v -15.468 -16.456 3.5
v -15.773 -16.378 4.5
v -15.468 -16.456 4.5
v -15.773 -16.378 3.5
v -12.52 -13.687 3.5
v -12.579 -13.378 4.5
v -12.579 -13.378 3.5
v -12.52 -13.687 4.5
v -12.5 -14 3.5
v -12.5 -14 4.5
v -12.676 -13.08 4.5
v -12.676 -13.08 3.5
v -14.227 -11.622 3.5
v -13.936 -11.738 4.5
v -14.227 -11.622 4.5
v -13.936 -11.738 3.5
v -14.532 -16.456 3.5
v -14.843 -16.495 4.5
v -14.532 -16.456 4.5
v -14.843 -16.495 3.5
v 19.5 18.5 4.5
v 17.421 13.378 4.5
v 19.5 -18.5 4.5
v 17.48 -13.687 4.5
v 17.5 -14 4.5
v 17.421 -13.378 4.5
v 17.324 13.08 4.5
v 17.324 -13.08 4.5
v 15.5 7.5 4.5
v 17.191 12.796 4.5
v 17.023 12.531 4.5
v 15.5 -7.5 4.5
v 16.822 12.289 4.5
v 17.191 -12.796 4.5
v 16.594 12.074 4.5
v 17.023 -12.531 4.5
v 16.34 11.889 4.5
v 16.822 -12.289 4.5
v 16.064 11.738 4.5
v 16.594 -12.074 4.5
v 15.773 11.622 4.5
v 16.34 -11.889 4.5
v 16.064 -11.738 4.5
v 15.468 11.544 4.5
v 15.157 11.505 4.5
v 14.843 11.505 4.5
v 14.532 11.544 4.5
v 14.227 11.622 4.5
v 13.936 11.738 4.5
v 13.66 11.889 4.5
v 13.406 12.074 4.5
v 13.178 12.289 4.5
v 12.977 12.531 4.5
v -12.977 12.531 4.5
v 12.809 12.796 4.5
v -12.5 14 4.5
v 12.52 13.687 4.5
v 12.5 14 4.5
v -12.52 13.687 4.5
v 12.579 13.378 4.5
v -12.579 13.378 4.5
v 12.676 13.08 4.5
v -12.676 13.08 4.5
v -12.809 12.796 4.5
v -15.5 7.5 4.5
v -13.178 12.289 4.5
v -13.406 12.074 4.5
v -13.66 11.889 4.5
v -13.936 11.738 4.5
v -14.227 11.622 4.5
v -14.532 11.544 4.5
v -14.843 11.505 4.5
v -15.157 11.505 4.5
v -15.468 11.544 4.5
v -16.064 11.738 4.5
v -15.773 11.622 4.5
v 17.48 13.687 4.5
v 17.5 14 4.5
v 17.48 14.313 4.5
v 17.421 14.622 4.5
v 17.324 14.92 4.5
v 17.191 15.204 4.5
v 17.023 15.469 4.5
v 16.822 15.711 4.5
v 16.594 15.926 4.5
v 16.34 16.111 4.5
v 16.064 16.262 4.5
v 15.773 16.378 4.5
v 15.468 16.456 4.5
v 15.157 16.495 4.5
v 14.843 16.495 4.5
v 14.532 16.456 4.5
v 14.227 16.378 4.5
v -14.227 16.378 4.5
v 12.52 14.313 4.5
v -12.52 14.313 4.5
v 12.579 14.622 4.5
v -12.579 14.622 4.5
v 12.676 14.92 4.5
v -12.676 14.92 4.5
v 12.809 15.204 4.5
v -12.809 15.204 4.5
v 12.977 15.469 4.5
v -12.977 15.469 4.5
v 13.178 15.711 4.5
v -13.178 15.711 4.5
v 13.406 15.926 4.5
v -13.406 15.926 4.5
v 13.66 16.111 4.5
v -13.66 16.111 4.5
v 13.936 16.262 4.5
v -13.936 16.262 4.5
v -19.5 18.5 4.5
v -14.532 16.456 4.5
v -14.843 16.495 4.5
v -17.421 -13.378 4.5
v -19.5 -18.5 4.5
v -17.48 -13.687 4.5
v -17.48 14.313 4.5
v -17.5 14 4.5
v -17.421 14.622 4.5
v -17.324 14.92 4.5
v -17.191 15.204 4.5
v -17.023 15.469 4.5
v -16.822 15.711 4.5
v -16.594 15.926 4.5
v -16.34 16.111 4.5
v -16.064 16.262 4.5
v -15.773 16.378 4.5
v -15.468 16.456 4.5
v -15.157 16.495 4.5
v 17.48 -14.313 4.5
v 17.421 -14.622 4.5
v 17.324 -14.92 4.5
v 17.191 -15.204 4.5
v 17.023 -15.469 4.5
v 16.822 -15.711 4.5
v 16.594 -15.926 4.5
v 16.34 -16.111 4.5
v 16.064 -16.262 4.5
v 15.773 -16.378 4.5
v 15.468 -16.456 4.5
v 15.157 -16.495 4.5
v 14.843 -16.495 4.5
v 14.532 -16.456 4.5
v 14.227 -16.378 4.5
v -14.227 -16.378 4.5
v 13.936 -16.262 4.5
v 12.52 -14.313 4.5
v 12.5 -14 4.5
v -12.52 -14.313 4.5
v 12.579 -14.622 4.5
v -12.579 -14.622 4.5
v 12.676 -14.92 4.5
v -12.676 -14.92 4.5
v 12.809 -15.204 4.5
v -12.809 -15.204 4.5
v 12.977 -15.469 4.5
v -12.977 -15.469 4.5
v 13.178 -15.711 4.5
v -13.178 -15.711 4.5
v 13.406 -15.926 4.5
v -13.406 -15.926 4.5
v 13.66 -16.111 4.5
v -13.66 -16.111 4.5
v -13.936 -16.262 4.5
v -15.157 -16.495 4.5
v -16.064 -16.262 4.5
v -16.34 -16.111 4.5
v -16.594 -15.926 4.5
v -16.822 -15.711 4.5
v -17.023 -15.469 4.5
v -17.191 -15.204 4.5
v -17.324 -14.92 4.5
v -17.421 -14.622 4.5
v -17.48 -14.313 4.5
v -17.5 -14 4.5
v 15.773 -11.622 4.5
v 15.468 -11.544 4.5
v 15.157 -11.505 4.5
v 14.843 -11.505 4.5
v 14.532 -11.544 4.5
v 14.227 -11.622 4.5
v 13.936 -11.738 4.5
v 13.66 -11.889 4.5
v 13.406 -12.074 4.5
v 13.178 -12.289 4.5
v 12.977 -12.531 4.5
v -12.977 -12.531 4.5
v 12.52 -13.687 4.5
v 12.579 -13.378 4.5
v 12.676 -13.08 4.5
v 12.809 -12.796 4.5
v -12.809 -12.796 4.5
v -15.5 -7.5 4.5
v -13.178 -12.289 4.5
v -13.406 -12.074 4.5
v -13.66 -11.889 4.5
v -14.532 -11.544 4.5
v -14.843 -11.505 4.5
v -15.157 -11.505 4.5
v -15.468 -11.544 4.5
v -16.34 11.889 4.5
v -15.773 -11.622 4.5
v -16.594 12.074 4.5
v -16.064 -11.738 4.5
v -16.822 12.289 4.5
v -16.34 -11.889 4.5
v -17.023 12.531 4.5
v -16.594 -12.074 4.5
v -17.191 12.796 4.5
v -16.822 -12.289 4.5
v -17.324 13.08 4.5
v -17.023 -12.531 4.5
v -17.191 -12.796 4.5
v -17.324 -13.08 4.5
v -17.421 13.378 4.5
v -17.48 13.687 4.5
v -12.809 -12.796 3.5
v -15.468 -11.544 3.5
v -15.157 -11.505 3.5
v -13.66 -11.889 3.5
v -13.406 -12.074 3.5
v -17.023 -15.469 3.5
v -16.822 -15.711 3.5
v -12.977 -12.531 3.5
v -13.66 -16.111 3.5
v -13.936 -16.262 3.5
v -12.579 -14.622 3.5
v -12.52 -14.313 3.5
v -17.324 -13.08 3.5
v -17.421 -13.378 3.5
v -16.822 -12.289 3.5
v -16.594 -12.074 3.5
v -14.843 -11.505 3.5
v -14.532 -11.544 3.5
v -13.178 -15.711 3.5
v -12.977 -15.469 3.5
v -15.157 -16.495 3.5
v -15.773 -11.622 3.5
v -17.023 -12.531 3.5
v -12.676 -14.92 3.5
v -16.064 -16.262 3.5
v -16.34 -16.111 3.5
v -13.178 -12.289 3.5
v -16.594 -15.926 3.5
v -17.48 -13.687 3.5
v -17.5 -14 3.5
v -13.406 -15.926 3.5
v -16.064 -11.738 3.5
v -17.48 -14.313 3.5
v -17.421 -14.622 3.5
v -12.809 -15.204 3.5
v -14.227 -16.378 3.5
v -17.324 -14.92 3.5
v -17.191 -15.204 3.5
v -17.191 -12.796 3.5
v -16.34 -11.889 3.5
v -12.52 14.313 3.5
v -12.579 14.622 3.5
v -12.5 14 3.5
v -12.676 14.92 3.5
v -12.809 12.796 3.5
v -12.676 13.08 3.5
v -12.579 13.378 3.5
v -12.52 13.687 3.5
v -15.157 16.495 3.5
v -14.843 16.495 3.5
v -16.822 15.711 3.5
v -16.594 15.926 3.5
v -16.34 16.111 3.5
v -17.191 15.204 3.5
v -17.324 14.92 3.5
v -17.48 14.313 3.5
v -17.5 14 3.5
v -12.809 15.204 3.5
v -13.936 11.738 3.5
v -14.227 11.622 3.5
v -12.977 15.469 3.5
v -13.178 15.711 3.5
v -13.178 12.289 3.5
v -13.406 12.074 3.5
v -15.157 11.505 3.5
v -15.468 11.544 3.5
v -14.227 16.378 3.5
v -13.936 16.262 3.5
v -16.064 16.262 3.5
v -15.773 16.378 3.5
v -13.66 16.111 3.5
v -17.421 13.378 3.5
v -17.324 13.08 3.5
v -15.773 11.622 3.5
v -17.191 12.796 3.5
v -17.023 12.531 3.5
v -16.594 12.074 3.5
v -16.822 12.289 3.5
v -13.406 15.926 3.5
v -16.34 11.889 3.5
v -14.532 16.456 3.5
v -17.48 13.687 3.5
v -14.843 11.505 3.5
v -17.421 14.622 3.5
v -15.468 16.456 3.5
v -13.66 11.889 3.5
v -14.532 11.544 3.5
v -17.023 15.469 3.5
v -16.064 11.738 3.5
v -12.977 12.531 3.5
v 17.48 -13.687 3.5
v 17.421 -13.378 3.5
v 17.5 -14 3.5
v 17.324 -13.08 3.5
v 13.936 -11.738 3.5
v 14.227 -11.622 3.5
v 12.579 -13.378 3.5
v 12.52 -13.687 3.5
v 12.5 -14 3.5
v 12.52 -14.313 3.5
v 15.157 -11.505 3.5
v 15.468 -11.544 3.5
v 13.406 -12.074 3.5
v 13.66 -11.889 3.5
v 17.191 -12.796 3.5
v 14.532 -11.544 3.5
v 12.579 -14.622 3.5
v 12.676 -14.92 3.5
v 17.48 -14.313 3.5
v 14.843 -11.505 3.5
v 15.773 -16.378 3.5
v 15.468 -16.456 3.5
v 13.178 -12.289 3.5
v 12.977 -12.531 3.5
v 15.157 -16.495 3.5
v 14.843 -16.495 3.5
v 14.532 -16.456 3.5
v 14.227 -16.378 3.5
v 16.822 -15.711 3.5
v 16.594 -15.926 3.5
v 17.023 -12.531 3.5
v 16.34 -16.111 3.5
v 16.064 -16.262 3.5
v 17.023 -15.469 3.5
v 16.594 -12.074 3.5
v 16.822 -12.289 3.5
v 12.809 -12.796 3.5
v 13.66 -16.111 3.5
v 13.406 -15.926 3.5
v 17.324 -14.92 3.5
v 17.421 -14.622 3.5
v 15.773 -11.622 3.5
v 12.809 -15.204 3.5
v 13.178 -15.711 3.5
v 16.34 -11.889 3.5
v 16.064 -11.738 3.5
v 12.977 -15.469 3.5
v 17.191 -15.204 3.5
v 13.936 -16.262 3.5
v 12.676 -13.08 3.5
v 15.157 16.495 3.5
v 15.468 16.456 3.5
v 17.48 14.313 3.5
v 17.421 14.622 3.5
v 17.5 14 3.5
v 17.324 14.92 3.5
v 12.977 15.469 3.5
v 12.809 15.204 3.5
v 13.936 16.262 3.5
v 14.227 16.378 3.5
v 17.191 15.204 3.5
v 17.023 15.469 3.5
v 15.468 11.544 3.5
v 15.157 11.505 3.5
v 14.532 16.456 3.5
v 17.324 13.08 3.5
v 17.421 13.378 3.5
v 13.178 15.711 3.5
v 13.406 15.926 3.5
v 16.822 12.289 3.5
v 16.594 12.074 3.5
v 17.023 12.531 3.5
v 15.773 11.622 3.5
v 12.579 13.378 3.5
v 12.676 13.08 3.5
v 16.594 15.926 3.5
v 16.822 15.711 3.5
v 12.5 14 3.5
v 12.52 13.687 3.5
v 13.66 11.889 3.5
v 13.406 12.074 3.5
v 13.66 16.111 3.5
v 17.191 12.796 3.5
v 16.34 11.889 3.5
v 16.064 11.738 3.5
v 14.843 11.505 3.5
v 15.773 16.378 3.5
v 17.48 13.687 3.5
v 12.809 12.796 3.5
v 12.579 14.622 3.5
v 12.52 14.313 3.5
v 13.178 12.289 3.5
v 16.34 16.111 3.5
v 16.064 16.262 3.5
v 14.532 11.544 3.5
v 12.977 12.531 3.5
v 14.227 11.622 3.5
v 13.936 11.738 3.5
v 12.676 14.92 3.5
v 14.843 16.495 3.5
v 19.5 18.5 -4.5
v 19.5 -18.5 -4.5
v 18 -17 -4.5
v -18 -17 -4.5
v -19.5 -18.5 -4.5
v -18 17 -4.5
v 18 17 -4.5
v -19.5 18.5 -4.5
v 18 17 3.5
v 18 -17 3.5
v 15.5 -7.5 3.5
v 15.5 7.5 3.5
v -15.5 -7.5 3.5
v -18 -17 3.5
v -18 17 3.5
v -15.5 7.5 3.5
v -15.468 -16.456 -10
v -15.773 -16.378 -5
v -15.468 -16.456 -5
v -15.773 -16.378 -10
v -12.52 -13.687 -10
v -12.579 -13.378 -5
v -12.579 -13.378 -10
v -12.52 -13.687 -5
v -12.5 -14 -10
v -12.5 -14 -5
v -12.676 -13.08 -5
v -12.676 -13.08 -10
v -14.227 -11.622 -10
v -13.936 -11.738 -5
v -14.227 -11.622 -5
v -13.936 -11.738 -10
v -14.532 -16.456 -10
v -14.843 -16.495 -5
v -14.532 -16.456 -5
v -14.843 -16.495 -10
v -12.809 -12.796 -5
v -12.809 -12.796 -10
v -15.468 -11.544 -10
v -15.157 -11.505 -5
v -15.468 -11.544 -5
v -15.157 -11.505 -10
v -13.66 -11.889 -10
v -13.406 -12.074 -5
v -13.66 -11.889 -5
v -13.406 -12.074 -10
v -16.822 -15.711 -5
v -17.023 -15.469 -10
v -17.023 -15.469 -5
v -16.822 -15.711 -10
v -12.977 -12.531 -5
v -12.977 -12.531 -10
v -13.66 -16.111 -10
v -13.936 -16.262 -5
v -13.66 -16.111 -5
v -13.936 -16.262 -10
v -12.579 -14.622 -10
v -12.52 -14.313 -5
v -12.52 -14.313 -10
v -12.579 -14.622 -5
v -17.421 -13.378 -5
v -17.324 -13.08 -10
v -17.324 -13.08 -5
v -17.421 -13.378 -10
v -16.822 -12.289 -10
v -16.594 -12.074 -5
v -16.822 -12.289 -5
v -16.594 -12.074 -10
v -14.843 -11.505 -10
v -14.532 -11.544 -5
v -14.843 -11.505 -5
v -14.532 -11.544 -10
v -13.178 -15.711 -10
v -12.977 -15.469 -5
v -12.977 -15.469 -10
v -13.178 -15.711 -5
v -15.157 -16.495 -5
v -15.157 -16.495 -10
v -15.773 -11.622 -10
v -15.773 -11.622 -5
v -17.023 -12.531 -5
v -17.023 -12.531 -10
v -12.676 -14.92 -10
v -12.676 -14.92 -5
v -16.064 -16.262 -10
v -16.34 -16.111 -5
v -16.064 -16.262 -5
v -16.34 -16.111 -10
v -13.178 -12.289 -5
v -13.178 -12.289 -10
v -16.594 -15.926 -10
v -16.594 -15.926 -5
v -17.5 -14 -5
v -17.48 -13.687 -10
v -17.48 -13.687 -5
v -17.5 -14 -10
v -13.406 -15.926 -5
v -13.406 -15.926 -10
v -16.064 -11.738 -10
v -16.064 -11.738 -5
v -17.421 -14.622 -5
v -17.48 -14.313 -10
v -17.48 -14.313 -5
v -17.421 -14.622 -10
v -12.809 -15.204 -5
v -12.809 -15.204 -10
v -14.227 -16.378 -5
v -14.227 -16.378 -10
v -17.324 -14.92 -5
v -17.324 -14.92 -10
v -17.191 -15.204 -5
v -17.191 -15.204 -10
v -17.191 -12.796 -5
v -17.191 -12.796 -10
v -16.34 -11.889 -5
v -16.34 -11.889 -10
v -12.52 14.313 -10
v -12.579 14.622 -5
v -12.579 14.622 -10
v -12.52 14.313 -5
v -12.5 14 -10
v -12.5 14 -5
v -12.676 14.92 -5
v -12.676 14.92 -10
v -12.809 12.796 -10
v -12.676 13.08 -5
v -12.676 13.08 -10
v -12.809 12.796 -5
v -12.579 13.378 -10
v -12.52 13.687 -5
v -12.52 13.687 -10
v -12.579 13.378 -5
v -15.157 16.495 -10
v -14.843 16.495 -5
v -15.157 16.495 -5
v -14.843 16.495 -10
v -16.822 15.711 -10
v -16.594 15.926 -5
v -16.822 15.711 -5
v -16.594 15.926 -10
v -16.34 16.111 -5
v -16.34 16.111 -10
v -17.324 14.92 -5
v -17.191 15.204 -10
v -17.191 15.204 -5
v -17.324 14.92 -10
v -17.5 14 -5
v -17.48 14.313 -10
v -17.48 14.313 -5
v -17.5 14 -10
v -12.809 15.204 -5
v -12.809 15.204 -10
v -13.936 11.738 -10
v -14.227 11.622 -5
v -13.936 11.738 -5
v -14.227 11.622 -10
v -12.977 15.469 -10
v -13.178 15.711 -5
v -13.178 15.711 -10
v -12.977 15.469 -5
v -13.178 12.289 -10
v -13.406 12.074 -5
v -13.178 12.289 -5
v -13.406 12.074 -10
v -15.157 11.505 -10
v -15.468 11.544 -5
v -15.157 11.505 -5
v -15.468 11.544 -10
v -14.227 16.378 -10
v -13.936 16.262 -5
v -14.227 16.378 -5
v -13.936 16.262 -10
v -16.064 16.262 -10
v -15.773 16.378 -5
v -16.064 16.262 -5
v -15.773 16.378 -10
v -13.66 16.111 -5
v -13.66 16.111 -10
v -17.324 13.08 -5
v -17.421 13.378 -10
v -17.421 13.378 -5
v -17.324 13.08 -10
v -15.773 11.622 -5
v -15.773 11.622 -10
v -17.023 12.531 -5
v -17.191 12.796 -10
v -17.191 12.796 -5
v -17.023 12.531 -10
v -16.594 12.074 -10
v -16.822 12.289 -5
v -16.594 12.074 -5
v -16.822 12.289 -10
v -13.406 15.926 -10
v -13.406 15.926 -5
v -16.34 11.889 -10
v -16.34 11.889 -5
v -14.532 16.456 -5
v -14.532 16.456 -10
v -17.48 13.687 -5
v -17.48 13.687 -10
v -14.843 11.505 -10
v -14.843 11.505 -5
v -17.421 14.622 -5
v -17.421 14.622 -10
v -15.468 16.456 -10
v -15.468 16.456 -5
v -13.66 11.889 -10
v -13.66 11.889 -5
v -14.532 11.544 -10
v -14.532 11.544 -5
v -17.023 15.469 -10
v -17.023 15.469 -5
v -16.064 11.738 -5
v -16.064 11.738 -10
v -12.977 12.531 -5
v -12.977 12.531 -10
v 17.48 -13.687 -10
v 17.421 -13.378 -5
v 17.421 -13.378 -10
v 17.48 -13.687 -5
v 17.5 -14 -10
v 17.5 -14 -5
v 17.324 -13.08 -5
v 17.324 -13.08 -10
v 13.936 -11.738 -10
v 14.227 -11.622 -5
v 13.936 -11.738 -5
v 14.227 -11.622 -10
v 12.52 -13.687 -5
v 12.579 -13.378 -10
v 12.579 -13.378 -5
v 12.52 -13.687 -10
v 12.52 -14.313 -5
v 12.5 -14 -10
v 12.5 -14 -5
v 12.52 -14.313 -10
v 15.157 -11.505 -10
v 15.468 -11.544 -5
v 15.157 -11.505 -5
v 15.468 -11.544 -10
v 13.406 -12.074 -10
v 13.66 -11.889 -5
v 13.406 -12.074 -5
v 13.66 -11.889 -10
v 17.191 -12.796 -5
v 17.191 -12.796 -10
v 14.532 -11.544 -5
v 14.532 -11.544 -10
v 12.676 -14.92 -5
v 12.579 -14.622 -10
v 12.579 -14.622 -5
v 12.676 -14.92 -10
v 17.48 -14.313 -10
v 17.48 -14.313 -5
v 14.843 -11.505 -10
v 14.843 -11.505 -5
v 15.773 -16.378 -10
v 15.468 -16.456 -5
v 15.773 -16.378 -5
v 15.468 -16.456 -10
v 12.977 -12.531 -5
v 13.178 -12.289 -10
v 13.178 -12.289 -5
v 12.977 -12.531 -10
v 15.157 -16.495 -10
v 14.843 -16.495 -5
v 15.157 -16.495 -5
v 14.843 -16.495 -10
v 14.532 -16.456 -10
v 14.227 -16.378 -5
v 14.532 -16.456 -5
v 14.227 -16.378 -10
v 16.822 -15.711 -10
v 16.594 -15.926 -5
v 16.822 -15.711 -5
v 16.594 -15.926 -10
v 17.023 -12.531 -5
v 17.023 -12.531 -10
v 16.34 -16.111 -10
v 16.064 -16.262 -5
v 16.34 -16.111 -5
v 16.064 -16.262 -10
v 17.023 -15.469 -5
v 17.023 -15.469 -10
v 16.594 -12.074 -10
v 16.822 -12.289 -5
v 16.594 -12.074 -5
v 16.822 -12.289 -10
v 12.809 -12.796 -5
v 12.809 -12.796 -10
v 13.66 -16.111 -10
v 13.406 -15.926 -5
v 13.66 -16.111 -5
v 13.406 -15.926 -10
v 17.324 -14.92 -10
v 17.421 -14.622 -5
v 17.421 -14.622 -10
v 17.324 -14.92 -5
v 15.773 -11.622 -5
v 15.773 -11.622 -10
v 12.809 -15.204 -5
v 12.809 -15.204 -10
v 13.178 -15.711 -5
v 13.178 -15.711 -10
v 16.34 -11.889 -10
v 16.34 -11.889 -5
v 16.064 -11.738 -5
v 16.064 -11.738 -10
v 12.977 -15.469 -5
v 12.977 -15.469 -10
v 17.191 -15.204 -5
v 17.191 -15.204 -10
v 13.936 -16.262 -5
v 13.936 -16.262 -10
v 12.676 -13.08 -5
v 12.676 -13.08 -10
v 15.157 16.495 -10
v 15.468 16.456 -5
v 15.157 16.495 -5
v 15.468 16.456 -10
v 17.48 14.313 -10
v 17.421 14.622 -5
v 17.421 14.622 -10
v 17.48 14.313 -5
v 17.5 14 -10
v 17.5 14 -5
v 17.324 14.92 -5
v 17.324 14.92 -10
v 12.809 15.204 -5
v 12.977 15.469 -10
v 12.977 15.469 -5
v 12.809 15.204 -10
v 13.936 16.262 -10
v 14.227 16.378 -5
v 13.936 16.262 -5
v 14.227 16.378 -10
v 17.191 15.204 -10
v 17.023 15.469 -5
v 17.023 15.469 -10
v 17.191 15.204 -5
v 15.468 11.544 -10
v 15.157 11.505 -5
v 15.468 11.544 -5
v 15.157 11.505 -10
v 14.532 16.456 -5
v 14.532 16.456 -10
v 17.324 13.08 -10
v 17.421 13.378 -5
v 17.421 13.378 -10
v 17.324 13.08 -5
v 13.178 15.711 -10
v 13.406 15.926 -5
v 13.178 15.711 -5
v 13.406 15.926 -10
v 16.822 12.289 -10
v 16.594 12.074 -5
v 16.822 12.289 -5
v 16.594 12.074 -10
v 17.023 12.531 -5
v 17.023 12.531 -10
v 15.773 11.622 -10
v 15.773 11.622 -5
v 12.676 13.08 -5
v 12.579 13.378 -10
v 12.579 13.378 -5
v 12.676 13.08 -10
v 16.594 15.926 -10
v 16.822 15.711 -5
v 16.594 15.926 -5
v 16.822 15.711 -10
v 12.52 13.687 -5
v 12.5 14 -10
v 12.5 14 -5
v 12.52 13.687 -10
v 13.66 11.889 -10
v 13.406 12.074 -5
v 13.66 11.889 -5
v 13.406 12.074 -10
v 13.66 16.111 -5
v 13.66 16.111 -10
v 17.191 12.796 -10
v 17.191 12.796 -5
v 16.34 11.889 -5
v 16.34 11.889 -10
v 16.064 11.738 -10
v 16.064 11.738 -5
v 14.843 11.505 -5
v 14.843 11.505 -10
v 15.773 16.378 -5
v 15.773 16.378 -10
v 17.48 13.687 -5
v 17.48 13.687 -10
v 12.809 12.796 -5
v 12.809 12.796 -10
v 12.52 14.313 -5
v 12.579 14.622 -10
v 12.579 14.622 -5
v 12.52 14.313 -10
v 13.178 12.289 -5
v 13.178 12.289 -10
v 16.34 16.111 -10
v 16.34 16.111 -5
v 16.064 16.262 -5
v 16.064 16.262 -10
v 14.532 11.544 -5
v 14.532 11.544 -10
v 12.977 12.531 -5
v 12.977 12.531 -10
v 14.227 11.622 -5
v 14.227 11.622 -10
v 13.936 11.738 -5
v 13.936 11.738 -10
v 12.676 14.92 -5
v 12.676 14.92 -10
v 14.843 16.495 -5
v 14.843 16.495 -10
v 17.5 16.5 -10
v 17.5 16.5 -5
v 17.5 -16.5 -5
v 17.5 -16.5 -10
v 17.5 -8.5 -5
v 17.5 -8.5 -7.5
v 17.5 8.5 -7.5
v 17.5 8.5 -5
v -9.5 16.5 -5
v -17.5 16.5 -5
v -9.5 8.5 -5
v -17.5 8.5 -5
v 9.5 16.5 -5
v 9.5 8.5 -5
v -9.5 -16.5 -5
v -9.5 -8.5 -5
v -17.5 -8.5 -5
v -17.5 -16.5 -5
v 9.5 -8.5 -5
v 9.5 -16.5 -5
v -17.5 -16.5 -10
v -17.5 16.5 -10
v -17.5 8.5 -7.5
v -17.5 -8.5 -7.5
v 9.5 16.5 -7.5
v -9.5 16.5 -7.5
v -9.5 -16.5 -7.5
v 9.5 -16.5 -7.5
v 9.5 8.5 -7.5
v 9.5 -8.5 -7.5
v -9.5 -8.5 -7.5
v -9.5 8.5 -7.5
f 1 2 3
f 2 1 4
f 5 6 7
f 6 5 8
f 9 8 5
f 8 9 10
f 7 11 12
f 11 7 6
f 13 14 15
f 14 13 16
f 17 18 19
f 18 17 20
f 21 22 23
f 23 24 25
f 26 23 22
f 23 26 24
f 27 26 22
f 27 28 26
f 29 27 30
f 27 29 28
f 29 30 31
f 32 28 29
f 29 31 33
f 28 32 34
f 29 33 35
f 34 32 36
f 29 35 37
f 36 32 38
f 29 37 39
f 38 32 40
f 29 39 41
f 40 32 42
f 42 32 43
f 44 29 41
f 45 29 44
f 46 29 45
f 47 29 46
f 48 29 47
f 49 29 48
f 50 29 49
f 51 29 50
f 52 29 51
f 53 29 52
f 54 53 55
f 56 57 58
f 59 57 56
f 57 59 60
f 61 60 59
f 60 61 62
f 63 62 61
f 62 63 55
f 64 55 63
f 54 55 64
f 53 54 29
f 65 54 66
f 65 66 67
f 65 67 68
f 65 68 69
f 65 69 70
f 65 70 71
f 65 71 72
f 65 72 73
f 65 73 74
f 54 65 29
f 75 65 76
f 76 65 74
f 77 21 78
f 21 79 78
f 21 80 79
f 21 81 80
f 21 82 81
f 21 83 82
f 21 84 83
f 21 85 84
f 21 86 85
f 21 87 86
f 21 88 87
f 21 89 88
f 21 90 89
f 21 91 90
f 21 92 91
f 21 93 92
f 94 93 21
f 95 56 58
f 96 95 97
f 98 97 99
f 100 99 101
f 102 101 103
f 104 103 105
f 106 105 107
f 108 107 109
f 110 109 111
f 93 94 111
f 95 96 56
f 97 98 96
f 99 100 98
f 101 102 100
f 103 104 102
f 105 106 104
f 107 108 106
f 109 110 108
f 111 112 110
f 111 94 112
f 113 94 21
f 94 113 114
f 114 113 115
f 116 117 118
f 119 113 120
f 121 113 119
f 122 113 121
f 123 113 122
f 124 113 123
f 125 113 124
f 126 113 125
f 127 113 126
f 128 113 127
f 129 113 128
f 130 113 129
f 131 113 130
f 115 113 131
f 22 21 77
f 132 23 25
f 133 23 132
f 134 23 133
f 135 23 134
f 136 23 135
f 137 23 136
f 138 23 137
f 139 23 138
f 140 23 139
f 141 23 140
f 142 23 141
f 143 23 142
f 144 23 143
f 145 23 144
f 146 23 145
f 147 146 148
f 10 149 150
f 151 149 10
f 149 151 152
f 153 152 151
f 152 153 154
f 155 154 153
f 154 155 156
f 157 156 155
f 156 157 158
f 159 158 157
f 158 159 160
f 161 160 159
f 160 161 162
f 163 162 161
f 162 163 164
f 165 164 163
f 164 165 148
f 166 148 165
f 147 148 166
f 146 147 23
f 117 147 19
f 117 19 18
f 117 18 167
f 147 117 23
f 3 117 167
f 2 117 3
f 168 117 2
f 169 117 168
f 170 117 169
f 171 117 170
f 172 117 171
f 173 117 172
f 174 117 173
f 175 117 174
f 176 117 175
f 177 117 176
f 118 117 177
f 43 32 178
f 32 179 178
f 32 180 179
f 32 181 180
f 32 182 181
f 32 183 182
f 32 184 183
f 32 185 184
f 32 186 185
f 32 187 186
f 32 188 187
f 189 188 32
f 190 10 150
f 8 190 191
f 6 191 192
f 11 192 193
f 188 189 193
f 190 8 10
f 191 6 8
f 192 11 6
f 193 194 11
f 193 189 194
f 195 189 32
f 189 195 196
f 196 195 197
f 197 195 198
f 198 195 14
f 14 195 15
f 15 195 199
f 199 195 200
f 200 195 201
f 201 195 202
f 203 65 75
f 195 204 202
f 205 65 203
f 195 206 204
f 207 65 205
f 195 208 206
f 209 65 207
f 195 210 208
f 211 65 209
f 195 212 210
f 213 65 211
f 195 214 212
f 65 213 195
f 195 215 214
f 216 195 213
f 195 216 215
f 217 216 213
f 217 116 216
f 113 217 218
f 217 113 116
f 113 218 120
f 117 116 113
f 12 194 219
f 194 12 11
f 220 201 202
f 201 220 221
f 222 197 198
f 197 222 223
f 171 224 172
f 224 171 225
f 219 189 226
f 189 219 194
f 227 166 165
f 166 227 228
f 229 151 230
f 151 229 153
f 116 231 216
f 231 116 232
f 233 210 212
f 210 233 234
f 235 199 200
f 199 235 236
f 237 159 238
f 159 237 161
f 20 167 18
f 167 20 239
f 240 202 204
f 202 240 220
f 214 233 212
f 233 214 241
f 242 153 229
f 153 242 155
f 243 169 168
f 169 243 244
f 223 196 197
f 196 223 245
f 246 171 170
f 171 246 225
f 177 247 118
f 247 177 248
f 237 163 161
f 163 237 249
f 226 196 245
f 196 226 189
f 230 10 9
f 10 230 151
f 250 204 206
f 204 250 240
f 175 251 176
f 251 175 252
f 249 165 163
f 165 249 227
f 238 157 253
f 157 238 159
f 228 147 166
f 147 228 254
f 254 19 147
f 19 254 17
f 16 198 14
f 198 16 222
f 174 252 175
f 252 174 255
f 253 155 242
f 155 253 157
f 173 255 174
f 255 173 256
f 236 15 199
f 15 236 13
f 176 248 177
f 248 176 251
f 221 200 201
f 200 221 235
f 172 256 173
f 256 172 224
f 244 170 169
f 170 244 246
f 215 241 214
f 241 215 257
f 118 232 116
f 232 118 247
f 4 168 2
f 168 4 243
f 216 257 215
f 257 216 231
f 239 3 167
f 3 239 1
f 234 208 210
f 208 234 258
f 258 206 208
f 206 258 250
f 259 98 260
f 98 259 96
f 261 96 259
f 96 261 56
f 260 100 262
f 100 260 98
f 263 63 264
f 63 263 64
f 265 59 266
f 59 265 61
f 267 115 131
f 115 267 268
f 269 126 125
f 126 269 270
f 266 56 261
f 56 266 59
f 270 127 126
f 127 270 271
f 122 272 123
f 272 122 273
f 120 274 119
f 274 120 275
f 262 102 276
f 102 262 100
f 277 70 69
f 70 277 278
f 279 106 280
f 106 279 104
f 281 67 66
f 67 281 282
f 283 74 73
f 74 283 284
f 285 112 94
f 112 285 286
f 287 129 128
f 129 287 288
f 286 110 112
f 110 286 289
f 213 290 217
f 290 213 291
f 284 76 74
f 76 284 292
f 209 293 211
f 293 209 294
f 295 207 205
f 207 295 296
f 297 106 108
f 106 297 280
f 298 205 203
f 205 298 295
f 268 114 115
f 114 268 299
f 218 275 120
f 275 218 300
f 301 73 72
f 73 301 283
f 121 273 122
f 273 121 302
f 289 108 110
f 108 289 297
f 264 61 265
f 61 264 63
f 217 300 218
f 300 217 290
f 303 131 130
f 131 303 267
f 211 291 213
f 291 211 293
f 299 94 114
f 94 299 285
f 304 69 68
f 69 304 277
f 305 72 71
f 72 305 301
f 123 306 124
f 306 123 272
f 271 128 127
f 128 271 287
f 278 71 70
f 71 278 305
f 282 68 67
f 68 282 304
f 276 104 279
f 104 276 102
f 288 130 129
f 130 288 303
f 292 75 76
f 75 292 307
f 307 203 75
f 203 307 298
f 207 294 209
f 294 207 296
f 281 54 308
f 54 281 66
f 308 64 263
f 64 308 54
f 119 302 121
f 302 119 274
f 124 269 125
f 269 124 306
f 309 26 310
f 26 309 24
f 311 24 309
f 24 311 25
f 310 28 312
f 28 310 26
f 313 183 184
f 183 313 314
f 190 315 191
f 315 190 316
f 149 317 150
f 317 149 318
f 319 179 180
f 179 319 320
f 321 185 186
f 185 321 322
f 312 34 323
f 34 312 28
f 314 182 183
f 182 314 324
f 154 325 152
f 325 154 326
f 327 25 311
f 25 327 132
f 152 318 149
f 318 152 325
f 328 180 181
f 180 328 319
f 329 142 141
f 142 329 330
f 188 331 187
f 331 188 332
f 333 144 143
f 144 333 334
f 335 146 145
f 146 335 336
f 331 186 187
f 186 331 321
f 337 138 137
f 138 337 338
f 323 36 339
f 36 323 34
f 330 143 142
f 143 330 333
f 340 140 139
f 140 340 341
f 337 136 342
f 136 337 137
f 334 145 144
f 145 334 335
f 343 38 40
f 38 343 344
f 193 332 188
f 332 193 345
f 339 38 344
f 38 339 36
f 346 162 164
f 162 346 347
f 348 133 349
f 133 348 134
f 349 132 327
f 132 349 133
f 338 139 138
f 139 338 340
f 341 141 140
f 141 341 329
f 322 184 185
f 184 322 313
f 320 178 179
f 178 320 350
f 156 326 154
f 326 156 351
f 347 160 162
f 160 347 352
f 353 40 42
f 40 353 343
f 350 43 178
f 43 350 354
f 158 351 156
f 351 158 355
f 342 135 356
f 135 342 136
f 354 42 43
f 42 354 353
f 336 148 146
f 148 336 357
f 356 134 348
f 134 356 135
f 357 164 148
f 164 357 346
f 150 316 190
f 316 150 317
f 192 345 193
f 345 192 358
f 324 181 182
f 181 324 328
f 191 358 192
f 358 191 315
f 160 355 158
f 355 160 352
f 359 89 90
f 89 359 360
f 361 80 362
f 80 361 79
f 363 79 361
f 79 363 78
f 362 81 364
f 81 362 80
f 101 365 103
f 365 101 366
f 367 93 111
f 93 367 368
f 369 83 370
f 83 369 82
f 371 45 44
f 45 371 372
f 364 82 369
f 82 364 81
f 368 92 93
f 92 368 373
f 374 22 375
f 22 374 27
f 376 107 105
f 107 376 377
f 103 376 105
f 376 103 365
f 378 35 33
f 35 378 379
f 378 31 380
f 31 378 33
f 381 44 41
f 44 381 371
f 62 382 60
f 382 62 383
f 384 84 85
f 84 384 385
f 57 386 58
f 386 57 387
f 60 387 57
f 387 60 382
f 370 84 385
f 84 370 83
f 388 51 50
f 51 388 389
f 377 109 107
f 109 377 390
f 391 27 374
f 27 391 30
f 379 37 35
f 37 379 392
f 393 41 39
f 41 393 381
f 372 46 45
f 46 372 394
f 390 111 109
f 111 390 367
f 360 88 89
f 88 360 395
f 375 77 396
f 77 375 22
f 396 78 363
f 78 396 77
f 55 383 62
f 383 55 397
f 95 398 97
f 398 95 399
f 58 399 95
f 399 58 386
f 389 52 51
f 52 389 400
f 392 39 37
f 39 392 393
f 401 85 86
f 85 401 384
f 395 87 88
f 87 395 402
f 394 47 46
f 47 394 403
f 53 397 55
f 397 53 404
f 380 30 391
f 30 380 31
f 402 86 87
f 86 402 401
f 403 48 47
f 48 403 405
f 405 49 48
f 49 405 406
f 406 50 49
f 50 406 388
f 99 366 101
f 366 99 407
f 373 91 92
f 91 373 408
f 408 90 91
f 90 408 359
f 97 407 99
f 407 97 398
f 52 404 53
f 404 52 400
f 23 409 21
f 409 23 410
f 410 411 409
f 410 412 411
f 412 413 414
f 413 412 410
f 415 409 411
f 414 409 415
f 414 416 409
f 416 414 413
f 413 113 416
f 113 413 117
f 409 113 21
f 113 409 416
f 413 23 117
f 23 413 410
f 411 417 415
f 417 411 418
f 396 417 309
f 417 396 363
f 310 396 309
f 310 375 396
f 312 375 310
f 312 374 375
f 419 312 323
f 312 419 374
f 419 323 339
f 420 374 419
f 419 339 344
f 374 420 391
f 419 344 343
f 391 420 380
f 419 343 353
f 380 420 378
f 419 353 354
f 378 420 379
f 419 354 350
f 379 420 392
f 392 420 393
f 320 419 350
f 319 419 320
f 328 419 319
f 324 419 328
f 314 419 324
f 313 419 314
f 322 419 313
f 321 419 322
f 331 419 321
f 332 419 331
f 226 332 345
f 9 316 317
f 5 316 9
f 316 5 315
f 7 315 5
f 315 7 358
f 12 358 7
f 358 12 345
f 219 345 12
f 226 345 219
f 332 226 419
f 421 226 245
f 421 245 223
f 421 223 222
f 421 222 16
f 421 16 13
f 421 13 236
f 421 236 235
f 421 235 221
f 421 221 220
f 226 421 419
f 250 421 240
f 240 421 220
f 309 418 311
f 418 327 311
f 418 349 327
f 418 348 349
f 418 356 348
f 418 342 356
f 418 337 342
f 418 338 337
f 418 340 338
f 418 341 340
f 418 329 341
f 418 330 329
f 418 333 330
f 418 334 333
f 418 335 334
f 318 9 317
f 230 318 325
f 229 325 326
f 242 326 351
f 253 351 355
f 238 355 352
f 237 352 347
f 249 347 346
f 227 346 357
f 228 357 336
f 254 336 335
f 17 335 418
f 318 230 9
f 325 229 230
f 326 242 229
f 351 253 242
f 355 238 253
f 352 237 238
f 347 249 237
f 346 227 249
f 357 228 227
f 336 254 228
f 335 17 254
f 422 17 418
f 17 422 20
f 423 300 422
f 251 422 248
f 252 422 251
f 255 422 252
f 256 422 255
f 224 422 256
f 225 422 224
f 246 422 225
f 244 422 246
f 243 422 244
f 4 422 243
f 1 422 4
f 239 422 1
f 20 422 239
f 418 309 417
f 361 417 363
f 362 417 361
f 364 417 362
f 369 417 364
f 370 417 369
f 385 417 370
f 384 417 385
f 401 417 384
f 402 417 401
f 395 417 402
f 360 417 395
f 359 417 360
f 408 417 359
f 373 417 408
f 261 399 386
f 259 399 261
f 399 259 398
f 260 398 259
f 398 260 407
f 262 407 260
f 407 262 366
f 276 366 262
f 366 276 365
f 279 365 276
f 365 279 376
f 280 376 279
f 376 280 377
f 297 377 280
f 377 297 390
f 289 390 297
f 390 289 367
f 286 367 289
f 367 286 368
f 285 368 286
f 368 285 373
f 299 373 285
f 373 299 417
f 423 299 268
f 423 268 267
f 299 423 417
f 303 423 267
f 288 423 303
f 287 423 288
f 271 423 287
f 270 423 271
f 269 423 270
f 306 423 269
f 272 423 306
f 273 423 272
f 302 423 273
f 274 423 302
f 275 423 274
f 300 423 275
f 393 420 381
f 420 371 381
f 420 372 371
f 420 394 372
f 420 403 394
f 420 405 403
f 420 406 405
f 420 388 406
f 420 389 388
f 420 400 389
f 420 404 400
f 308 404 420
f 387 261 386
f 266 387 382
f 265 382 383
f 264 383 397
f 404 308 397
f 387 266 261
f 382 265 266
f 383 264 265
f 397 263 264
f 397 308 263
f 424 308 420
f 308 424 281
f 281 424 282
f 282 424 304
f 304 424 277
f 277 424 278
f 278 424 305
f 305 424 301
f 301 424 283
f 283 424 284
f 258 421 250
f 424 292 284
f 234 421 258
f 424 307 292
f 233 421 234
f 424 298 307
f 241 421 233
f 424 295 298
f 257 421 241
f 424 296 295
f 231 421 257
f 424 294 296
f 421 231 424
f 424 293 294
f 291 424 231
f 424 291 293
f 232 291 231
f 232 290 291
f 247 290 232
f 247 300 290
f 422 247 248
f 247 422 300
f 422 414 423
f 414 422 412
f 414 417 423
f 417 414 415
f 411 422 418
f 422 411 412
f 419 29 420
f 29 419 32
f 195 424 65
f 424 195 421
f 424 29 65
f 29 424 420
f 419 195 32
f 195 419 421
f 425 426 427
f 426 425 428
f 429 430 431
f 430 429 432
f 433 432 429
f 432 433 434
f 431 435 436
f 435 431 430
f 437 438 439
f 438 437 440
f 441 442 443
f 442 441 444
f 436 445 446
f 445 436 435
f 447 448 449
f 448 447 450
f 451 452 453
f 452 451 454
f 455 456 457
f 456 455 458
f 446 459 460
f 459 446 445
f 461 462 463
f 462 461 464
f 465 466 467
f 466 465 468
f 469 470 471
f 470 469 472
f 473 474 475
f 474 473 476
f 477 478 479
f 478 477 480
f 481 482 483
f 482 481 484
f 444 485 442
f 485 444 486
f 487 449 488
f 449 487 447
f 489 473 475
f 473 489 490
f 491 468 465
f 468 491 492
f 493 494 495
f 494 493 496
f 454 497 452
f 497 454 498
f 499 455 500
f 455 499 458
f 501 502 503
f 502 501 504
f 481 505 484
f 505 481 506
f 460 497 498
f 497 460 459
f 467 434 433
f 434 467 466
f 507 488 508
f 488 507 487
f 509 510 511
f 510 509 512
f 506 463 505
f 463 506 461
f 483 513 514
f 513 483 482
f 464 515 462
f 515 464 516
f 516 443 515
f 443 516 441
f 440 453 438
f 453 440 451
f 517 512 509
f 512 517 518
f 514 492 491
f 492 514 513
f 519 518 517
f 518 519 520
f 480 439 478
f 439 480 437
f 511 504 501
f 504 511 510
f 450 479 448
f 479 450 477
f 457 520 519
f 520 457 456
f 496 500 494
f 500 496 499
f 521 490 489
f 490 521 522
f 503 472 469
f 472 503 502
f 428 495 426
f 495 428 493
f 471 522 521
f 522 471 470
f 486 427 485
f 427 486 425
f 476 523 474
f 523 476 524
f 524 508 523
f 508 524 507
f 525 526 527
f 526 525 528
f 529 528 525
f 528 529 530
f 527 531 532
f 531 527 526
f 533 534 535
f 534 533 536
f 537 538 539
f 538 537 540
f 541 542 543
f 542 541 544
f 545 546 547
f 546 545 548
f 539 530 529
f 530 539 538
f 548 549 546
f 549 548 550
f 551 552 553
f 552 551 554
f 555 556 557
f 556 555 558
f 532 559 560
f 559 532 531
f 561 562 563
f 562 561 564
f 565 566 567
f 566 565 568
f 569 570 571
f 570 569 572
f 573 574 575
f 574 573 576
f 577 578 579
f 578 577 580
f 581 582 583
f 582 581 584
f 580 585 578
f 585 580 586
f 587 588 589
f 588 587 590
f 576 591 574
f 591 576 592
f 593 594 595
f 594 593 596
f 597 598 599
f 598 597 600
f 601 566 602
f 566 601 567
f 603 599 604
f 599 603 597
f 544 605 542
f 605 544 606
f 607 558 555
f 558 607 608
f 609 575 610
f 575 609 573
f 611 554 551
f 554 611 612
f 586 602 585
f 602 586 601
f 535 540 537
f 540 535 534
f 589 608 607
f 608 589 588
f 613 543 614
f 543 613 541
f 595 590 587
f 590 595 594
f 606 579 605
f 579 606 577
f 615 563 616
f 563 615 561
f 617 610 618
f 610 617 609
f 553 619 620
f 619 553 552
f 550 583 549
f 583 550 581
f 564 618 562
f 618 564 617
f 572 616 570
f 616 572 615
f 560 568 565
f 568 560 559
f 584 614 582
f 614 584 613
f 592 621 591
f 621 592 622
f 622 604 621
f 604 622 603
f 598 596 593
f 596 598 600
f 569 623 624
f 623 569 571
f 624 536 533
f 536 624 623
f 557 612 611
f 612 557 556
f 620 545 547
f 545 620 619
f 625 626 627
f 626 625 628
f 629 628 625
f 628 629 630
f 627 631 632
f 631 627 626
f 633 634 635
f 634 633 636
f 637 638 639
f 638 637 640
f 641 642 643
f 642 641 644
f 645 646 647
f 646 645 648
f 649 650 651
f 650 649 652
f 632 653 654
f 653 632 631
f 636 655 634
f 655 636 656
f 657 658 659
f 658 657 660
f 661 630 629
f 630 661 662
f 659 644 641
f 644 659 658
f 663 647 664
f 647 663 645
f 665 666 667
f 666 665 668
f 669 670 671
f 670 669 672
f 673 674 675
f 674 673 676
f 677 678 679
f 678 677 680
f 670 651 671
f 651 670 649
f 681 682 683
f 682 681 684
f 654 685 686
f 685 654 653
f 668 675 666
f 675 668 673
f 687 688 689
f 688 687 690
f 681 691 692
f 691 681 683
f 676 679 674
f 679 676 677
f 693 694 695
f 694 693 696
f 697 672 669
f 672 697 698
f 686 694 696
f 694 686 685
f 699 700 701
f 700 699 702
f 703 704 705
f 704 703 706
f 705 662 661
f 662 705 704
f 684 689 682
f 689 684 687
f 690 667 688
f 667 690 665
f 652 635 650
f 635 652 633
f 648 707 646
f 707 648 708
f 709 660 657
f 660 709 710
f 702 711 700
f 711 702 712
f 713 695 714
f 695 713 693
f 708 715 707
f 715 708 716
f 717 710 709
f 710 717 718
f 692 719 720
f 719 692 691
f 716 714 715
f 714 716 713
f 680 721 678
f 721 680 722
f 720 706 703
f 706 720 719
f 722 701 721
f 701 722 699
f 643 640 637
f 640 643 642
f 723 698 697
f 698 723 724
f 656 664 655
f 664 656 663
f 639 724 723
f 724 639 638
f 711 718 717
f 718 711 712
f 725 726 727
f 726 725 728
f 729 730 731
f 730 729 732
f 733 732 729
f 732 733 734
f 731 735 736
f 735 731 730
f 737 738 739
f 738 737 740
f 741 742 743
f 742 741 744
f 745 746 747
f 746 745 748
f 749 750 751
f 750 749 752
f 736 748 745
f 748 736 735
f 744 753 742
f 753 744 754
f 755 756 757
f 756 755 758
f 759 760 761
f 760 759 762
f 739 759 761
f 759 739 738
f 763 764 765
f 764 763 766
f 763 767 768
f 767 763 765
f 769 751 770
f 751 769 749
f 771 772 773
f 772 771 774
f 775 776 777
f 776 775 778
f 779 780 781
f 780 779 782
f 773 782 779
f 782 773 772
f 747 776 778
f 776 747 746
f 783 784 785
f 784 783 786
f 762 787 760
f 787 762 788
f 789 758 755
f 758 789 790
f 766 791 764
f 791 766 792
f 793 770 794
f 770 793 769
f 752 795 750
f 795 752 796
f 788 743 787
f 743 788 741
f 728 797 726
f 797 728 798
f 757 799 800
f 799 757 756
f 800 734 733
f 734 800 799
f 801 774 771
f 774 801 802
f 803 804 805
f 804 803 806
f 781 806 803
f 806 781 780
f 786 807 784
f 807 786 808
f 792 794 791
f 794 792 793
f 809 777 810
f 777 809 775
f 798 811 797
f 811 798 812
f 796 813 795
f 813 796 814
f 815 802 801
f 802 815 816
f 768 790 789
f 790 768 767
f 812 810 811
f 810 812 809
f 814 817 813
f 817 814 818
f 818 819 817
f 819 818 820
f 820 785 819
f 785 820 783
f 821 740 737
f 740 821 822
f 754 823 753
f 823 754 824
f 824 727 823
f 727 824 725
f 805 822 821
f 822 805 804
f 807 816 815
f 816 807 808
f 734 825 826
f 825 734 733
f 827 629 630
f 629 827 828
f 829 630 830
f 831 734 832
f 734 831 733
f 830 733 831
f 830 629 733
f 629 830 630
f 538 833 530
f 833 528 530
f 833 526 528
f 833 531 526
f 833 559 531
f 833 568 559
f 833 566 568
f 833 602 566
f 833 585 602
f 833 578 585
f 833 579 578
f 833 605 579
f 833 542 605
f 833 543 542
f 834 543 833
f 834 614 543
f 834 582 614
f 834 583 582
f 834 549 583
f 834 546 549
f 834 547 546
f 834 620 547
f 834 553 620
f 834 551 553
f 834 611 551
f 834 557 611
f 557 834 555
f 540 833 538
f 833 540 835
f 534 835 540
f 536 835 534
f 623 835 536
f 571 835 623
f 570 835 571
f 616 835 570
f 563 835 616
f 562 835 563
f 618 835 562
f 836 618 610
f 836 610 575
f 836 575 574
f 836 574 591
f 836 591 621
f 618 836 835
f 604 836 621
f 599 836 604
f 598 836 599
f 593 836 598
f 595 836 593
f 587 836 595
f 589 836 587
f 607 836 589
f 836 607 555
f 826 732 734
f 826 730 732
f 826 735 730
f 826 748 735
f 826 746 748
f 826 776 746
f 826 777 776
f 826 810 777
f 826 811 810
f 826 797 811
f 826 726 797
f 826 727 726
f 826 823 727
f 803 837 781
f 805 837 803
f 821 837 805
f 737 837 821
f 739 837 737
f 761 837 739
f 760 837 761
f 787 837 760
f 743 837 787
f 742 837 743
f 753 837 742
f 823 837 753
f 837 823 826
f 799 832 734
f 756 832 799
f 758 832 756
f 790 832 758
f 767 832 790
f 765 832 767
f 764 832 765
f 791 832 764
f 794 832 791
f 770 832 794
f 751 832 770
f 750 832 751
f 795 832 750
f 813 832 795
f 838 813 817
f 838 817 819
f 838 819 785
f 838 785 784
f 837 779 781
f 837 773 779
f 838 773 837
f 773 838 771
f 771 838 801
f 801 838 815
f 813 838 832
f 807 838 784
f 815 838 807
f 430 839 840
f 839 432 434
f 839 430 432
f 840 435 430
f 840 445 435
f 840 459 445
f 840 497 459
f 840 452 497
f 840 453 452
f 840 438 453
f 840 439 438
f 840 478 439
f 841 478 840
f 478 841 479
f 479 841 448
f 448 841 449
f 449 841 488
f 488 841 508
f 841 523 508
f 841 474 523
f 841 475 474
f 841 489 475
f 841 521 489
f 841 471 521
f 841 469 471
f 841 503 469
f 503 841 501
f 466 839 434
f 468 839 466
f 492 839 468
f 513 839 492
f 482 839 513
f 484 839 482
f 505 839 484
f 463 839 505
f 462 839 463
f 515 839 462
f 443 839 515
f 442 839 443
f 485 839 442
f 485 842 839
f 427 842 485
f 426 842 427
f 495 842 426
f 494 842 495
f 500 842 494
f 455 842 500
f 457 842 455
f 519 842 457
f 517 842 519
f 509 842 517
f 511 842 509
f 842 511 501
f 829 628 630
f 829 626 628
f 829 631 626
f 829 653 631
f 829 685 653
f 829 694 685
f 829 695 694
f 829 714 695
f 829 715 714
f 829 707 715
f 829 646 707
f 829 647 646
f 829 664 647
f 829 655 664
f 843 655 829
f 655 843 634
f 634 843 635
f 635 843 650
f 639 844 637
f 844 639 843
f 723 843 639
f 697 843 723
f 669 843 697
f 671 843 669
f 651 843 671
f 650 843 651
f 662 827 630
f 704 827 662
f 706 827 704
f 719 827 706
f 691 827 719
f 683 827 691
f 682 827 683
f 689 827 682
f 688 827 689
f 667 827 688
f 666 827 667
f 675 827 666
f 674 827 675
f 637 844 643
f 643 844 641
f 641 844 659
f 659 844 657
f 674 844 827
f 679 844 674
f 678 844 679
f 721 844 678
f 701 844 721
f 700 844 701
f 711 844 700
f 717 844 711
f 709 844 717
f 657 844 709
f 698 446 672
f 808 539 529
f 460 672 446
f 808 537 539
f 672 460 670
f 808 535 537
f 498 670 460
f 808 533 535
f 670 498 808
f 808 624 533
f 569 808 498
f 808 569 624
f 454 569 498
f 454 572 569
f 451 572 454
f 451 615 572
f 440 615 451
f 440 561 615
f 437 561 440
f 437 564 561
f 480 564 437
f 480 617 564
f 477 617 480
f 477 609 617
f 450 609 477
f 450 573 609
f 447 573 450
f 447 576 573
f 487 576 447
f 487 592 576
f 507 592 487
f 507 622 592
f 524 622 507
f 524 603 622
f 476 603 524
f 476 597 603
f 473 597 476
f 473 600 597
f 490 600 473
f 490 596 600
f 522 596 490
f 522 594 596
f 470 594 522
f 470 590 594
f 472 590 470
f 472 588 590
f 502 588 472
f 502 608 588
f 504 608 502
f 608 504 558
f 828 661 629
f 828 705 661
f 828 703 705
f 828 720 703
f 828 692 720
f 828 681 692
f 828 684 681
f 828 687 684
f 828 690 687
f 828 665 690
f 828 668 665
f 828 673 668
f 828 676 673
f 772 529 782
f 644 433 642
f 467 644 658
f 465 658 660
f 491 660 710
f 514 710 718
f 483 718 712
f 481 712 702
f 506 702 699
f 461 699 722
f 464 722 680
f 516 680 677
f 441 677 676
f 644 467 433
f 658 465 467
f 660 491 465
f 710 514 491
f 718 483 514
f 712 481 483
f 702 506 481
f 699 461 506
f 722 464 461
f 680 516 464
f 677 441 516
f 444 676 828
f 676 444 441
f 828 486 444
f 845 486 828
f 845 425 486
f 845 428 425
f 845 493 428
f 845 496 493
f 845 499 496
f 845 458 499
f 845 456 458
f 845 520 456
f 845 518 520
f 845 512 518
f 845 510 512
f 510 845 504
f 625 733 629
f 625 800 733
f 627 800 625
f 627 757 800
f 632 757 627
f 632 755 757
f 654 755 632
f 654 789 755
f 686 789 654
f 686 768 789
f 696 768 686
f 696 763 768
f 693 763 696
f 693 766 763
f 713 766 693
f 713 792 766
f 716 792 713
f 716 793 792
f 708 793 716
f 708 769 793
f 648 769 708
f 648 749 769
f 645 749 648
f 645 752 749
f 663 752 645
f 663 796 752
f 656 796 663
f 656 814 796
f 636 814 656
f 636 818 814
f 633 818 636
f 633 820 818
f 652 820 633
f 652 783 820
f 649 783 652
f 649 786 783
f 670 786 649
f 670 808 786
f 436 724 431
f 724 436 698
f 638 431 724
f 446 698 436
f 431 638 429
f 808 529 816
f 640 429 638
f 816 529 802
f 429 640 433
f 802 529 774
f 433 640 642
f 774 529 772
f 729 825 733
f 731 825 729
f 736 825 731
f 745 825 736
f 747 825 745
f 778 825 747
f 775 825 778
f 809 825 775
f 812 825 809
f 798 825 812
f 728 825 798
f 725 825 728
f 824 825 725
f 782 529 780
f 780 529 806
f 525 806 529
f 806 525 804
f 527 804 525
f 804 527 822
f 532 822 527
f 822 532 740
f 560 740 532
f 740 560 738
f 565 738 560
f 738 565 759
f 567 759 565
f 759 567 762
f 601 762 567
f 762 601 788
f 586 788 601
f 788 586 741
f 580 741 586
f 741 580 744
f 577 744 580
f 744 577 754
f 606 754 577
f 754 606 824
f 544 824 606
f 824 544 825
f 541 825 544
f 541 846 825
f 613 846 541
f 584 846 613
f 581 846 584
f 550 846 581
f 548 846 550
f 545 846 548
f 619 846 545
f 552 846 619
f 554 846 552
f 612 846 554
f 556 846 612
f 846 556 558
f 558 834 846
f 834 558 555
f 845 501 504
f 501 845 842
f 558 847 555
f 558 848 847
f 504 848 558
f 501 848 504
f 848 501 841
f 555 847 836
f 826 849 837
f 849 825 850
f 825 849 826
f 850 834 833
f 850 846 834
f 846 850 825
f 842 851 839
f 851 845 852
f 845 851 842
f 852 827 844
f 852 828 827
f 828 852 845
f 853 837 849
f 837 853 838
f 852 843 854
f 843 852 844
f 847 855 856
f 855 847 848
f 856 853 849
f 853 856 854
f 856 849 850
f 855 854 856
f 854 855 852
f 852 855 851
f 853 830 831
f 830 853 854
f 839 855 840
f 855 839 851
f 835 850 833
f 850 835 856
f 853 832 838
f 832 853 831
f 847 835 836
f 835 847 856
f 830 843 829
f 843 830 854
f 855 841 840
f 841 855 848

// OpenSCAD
// Parameters for the OLED display (adjust as needed)
display_width = 36;      // width of the OLED display
display_height = 34;     // height of the OLED display board
display_thickness = 12;  // thickness of the display board
screen_width = 31;       // visible width of the OLED screen
screen_height = 15;      // visible height of the OLED screen
border_thickness = 1.5;    // thickness of case borders
case_depth = 9;          // depth of the front case part
screw_hole_diameter = 5; // diameter of screw holes
offsetX = 4.5;             // distance of screw holes from the left and right edges
offsetY = 4.5;             // distance of screw holes from the top and 

// Parameters for the OLED inner part with corner extrusions
inner_depth = case_depth - display_thickness; // Depth of the inner part to fit inside the front case
inner_border_thickness = 1; // Thickness of the inner border for stability

extrusion_height = 3;
extrusion_side_length=8;
inner_plate_thickness=2;
inner_plate_snapping_tolerance=1;


  // Outer case dimensions
    outer_width = display_width + 2 * border_thickness;
    outer_height = display_height + 2 * border_thickness;
    
module oled_inner_part() {
    // Inner part dimensions, slightly smaller than outer case inner cavity
    inner_width = display_width -inner_plate_snapping_tolerance;
    inner_height = display_height -inner_plate_snapping_tolerance;
translate([0,0,-6]){
    difference(){
    translate([0,0,-extrusion_height/2])
        cube([inner_width, inner_height, inner_plate_thickness+extrusion_height], center = true);
    
   
    cube([inner_width-2*extrusion_side_length, inner_height, extrusion_height], center = true);
    cube([inner_width, inner_height-2*extrusion_side_length, extrusion_height], center = true);

// Round screw holes in each corner with separate offsetX and offsetY
        for (x = [-outer_width / 2 + offsetX, outer_width / 2 - offsetX])
        for (y = [-outer_height / 2 + offsetY, outer_height / 2 - offsetY])
            translate([x, y, 0])
                cylinder(h = case_depth, d = screw_hole_diameter, center = true, $fn = 50);
    }
    }
}
    







// Main case front
module oled_case_front() {
  
    
    // Create outer shell with holes
    difference() {
        // Base outer shell
        cube([outer_width, outer_height, case_depth], center = true);
        
        // Hollow out space for the display board
        translate([0, 0, -1])  // slight offset to avoid flush faces
            cube([display_width, display_height, case_depth], center = true);
        
        // Cutout for the visible screen area
        translate([0, 0, case_depth/2 - 1])
            cube([screen_width, screen_height, case_depth], center = true);

        // Round screw holes in each corner with separate offsetX and offsetY
        for (x = [-outer_width / 2 + offsetX, outer_width / 2 - offsetX])
        for (y = [-outer_height / 2 + offsetY, outer_height / 2 - offsetY])
            translate([x, y, 0])
                cylinder(h = case_depth, d = screw_hole_diameter, center = true, $fn = 50);
    }
}

// Call the module to create the case front with screw holes
#oled_case_front();
// Call the module to create the inner part for the OLED display
oled_inner_part();
